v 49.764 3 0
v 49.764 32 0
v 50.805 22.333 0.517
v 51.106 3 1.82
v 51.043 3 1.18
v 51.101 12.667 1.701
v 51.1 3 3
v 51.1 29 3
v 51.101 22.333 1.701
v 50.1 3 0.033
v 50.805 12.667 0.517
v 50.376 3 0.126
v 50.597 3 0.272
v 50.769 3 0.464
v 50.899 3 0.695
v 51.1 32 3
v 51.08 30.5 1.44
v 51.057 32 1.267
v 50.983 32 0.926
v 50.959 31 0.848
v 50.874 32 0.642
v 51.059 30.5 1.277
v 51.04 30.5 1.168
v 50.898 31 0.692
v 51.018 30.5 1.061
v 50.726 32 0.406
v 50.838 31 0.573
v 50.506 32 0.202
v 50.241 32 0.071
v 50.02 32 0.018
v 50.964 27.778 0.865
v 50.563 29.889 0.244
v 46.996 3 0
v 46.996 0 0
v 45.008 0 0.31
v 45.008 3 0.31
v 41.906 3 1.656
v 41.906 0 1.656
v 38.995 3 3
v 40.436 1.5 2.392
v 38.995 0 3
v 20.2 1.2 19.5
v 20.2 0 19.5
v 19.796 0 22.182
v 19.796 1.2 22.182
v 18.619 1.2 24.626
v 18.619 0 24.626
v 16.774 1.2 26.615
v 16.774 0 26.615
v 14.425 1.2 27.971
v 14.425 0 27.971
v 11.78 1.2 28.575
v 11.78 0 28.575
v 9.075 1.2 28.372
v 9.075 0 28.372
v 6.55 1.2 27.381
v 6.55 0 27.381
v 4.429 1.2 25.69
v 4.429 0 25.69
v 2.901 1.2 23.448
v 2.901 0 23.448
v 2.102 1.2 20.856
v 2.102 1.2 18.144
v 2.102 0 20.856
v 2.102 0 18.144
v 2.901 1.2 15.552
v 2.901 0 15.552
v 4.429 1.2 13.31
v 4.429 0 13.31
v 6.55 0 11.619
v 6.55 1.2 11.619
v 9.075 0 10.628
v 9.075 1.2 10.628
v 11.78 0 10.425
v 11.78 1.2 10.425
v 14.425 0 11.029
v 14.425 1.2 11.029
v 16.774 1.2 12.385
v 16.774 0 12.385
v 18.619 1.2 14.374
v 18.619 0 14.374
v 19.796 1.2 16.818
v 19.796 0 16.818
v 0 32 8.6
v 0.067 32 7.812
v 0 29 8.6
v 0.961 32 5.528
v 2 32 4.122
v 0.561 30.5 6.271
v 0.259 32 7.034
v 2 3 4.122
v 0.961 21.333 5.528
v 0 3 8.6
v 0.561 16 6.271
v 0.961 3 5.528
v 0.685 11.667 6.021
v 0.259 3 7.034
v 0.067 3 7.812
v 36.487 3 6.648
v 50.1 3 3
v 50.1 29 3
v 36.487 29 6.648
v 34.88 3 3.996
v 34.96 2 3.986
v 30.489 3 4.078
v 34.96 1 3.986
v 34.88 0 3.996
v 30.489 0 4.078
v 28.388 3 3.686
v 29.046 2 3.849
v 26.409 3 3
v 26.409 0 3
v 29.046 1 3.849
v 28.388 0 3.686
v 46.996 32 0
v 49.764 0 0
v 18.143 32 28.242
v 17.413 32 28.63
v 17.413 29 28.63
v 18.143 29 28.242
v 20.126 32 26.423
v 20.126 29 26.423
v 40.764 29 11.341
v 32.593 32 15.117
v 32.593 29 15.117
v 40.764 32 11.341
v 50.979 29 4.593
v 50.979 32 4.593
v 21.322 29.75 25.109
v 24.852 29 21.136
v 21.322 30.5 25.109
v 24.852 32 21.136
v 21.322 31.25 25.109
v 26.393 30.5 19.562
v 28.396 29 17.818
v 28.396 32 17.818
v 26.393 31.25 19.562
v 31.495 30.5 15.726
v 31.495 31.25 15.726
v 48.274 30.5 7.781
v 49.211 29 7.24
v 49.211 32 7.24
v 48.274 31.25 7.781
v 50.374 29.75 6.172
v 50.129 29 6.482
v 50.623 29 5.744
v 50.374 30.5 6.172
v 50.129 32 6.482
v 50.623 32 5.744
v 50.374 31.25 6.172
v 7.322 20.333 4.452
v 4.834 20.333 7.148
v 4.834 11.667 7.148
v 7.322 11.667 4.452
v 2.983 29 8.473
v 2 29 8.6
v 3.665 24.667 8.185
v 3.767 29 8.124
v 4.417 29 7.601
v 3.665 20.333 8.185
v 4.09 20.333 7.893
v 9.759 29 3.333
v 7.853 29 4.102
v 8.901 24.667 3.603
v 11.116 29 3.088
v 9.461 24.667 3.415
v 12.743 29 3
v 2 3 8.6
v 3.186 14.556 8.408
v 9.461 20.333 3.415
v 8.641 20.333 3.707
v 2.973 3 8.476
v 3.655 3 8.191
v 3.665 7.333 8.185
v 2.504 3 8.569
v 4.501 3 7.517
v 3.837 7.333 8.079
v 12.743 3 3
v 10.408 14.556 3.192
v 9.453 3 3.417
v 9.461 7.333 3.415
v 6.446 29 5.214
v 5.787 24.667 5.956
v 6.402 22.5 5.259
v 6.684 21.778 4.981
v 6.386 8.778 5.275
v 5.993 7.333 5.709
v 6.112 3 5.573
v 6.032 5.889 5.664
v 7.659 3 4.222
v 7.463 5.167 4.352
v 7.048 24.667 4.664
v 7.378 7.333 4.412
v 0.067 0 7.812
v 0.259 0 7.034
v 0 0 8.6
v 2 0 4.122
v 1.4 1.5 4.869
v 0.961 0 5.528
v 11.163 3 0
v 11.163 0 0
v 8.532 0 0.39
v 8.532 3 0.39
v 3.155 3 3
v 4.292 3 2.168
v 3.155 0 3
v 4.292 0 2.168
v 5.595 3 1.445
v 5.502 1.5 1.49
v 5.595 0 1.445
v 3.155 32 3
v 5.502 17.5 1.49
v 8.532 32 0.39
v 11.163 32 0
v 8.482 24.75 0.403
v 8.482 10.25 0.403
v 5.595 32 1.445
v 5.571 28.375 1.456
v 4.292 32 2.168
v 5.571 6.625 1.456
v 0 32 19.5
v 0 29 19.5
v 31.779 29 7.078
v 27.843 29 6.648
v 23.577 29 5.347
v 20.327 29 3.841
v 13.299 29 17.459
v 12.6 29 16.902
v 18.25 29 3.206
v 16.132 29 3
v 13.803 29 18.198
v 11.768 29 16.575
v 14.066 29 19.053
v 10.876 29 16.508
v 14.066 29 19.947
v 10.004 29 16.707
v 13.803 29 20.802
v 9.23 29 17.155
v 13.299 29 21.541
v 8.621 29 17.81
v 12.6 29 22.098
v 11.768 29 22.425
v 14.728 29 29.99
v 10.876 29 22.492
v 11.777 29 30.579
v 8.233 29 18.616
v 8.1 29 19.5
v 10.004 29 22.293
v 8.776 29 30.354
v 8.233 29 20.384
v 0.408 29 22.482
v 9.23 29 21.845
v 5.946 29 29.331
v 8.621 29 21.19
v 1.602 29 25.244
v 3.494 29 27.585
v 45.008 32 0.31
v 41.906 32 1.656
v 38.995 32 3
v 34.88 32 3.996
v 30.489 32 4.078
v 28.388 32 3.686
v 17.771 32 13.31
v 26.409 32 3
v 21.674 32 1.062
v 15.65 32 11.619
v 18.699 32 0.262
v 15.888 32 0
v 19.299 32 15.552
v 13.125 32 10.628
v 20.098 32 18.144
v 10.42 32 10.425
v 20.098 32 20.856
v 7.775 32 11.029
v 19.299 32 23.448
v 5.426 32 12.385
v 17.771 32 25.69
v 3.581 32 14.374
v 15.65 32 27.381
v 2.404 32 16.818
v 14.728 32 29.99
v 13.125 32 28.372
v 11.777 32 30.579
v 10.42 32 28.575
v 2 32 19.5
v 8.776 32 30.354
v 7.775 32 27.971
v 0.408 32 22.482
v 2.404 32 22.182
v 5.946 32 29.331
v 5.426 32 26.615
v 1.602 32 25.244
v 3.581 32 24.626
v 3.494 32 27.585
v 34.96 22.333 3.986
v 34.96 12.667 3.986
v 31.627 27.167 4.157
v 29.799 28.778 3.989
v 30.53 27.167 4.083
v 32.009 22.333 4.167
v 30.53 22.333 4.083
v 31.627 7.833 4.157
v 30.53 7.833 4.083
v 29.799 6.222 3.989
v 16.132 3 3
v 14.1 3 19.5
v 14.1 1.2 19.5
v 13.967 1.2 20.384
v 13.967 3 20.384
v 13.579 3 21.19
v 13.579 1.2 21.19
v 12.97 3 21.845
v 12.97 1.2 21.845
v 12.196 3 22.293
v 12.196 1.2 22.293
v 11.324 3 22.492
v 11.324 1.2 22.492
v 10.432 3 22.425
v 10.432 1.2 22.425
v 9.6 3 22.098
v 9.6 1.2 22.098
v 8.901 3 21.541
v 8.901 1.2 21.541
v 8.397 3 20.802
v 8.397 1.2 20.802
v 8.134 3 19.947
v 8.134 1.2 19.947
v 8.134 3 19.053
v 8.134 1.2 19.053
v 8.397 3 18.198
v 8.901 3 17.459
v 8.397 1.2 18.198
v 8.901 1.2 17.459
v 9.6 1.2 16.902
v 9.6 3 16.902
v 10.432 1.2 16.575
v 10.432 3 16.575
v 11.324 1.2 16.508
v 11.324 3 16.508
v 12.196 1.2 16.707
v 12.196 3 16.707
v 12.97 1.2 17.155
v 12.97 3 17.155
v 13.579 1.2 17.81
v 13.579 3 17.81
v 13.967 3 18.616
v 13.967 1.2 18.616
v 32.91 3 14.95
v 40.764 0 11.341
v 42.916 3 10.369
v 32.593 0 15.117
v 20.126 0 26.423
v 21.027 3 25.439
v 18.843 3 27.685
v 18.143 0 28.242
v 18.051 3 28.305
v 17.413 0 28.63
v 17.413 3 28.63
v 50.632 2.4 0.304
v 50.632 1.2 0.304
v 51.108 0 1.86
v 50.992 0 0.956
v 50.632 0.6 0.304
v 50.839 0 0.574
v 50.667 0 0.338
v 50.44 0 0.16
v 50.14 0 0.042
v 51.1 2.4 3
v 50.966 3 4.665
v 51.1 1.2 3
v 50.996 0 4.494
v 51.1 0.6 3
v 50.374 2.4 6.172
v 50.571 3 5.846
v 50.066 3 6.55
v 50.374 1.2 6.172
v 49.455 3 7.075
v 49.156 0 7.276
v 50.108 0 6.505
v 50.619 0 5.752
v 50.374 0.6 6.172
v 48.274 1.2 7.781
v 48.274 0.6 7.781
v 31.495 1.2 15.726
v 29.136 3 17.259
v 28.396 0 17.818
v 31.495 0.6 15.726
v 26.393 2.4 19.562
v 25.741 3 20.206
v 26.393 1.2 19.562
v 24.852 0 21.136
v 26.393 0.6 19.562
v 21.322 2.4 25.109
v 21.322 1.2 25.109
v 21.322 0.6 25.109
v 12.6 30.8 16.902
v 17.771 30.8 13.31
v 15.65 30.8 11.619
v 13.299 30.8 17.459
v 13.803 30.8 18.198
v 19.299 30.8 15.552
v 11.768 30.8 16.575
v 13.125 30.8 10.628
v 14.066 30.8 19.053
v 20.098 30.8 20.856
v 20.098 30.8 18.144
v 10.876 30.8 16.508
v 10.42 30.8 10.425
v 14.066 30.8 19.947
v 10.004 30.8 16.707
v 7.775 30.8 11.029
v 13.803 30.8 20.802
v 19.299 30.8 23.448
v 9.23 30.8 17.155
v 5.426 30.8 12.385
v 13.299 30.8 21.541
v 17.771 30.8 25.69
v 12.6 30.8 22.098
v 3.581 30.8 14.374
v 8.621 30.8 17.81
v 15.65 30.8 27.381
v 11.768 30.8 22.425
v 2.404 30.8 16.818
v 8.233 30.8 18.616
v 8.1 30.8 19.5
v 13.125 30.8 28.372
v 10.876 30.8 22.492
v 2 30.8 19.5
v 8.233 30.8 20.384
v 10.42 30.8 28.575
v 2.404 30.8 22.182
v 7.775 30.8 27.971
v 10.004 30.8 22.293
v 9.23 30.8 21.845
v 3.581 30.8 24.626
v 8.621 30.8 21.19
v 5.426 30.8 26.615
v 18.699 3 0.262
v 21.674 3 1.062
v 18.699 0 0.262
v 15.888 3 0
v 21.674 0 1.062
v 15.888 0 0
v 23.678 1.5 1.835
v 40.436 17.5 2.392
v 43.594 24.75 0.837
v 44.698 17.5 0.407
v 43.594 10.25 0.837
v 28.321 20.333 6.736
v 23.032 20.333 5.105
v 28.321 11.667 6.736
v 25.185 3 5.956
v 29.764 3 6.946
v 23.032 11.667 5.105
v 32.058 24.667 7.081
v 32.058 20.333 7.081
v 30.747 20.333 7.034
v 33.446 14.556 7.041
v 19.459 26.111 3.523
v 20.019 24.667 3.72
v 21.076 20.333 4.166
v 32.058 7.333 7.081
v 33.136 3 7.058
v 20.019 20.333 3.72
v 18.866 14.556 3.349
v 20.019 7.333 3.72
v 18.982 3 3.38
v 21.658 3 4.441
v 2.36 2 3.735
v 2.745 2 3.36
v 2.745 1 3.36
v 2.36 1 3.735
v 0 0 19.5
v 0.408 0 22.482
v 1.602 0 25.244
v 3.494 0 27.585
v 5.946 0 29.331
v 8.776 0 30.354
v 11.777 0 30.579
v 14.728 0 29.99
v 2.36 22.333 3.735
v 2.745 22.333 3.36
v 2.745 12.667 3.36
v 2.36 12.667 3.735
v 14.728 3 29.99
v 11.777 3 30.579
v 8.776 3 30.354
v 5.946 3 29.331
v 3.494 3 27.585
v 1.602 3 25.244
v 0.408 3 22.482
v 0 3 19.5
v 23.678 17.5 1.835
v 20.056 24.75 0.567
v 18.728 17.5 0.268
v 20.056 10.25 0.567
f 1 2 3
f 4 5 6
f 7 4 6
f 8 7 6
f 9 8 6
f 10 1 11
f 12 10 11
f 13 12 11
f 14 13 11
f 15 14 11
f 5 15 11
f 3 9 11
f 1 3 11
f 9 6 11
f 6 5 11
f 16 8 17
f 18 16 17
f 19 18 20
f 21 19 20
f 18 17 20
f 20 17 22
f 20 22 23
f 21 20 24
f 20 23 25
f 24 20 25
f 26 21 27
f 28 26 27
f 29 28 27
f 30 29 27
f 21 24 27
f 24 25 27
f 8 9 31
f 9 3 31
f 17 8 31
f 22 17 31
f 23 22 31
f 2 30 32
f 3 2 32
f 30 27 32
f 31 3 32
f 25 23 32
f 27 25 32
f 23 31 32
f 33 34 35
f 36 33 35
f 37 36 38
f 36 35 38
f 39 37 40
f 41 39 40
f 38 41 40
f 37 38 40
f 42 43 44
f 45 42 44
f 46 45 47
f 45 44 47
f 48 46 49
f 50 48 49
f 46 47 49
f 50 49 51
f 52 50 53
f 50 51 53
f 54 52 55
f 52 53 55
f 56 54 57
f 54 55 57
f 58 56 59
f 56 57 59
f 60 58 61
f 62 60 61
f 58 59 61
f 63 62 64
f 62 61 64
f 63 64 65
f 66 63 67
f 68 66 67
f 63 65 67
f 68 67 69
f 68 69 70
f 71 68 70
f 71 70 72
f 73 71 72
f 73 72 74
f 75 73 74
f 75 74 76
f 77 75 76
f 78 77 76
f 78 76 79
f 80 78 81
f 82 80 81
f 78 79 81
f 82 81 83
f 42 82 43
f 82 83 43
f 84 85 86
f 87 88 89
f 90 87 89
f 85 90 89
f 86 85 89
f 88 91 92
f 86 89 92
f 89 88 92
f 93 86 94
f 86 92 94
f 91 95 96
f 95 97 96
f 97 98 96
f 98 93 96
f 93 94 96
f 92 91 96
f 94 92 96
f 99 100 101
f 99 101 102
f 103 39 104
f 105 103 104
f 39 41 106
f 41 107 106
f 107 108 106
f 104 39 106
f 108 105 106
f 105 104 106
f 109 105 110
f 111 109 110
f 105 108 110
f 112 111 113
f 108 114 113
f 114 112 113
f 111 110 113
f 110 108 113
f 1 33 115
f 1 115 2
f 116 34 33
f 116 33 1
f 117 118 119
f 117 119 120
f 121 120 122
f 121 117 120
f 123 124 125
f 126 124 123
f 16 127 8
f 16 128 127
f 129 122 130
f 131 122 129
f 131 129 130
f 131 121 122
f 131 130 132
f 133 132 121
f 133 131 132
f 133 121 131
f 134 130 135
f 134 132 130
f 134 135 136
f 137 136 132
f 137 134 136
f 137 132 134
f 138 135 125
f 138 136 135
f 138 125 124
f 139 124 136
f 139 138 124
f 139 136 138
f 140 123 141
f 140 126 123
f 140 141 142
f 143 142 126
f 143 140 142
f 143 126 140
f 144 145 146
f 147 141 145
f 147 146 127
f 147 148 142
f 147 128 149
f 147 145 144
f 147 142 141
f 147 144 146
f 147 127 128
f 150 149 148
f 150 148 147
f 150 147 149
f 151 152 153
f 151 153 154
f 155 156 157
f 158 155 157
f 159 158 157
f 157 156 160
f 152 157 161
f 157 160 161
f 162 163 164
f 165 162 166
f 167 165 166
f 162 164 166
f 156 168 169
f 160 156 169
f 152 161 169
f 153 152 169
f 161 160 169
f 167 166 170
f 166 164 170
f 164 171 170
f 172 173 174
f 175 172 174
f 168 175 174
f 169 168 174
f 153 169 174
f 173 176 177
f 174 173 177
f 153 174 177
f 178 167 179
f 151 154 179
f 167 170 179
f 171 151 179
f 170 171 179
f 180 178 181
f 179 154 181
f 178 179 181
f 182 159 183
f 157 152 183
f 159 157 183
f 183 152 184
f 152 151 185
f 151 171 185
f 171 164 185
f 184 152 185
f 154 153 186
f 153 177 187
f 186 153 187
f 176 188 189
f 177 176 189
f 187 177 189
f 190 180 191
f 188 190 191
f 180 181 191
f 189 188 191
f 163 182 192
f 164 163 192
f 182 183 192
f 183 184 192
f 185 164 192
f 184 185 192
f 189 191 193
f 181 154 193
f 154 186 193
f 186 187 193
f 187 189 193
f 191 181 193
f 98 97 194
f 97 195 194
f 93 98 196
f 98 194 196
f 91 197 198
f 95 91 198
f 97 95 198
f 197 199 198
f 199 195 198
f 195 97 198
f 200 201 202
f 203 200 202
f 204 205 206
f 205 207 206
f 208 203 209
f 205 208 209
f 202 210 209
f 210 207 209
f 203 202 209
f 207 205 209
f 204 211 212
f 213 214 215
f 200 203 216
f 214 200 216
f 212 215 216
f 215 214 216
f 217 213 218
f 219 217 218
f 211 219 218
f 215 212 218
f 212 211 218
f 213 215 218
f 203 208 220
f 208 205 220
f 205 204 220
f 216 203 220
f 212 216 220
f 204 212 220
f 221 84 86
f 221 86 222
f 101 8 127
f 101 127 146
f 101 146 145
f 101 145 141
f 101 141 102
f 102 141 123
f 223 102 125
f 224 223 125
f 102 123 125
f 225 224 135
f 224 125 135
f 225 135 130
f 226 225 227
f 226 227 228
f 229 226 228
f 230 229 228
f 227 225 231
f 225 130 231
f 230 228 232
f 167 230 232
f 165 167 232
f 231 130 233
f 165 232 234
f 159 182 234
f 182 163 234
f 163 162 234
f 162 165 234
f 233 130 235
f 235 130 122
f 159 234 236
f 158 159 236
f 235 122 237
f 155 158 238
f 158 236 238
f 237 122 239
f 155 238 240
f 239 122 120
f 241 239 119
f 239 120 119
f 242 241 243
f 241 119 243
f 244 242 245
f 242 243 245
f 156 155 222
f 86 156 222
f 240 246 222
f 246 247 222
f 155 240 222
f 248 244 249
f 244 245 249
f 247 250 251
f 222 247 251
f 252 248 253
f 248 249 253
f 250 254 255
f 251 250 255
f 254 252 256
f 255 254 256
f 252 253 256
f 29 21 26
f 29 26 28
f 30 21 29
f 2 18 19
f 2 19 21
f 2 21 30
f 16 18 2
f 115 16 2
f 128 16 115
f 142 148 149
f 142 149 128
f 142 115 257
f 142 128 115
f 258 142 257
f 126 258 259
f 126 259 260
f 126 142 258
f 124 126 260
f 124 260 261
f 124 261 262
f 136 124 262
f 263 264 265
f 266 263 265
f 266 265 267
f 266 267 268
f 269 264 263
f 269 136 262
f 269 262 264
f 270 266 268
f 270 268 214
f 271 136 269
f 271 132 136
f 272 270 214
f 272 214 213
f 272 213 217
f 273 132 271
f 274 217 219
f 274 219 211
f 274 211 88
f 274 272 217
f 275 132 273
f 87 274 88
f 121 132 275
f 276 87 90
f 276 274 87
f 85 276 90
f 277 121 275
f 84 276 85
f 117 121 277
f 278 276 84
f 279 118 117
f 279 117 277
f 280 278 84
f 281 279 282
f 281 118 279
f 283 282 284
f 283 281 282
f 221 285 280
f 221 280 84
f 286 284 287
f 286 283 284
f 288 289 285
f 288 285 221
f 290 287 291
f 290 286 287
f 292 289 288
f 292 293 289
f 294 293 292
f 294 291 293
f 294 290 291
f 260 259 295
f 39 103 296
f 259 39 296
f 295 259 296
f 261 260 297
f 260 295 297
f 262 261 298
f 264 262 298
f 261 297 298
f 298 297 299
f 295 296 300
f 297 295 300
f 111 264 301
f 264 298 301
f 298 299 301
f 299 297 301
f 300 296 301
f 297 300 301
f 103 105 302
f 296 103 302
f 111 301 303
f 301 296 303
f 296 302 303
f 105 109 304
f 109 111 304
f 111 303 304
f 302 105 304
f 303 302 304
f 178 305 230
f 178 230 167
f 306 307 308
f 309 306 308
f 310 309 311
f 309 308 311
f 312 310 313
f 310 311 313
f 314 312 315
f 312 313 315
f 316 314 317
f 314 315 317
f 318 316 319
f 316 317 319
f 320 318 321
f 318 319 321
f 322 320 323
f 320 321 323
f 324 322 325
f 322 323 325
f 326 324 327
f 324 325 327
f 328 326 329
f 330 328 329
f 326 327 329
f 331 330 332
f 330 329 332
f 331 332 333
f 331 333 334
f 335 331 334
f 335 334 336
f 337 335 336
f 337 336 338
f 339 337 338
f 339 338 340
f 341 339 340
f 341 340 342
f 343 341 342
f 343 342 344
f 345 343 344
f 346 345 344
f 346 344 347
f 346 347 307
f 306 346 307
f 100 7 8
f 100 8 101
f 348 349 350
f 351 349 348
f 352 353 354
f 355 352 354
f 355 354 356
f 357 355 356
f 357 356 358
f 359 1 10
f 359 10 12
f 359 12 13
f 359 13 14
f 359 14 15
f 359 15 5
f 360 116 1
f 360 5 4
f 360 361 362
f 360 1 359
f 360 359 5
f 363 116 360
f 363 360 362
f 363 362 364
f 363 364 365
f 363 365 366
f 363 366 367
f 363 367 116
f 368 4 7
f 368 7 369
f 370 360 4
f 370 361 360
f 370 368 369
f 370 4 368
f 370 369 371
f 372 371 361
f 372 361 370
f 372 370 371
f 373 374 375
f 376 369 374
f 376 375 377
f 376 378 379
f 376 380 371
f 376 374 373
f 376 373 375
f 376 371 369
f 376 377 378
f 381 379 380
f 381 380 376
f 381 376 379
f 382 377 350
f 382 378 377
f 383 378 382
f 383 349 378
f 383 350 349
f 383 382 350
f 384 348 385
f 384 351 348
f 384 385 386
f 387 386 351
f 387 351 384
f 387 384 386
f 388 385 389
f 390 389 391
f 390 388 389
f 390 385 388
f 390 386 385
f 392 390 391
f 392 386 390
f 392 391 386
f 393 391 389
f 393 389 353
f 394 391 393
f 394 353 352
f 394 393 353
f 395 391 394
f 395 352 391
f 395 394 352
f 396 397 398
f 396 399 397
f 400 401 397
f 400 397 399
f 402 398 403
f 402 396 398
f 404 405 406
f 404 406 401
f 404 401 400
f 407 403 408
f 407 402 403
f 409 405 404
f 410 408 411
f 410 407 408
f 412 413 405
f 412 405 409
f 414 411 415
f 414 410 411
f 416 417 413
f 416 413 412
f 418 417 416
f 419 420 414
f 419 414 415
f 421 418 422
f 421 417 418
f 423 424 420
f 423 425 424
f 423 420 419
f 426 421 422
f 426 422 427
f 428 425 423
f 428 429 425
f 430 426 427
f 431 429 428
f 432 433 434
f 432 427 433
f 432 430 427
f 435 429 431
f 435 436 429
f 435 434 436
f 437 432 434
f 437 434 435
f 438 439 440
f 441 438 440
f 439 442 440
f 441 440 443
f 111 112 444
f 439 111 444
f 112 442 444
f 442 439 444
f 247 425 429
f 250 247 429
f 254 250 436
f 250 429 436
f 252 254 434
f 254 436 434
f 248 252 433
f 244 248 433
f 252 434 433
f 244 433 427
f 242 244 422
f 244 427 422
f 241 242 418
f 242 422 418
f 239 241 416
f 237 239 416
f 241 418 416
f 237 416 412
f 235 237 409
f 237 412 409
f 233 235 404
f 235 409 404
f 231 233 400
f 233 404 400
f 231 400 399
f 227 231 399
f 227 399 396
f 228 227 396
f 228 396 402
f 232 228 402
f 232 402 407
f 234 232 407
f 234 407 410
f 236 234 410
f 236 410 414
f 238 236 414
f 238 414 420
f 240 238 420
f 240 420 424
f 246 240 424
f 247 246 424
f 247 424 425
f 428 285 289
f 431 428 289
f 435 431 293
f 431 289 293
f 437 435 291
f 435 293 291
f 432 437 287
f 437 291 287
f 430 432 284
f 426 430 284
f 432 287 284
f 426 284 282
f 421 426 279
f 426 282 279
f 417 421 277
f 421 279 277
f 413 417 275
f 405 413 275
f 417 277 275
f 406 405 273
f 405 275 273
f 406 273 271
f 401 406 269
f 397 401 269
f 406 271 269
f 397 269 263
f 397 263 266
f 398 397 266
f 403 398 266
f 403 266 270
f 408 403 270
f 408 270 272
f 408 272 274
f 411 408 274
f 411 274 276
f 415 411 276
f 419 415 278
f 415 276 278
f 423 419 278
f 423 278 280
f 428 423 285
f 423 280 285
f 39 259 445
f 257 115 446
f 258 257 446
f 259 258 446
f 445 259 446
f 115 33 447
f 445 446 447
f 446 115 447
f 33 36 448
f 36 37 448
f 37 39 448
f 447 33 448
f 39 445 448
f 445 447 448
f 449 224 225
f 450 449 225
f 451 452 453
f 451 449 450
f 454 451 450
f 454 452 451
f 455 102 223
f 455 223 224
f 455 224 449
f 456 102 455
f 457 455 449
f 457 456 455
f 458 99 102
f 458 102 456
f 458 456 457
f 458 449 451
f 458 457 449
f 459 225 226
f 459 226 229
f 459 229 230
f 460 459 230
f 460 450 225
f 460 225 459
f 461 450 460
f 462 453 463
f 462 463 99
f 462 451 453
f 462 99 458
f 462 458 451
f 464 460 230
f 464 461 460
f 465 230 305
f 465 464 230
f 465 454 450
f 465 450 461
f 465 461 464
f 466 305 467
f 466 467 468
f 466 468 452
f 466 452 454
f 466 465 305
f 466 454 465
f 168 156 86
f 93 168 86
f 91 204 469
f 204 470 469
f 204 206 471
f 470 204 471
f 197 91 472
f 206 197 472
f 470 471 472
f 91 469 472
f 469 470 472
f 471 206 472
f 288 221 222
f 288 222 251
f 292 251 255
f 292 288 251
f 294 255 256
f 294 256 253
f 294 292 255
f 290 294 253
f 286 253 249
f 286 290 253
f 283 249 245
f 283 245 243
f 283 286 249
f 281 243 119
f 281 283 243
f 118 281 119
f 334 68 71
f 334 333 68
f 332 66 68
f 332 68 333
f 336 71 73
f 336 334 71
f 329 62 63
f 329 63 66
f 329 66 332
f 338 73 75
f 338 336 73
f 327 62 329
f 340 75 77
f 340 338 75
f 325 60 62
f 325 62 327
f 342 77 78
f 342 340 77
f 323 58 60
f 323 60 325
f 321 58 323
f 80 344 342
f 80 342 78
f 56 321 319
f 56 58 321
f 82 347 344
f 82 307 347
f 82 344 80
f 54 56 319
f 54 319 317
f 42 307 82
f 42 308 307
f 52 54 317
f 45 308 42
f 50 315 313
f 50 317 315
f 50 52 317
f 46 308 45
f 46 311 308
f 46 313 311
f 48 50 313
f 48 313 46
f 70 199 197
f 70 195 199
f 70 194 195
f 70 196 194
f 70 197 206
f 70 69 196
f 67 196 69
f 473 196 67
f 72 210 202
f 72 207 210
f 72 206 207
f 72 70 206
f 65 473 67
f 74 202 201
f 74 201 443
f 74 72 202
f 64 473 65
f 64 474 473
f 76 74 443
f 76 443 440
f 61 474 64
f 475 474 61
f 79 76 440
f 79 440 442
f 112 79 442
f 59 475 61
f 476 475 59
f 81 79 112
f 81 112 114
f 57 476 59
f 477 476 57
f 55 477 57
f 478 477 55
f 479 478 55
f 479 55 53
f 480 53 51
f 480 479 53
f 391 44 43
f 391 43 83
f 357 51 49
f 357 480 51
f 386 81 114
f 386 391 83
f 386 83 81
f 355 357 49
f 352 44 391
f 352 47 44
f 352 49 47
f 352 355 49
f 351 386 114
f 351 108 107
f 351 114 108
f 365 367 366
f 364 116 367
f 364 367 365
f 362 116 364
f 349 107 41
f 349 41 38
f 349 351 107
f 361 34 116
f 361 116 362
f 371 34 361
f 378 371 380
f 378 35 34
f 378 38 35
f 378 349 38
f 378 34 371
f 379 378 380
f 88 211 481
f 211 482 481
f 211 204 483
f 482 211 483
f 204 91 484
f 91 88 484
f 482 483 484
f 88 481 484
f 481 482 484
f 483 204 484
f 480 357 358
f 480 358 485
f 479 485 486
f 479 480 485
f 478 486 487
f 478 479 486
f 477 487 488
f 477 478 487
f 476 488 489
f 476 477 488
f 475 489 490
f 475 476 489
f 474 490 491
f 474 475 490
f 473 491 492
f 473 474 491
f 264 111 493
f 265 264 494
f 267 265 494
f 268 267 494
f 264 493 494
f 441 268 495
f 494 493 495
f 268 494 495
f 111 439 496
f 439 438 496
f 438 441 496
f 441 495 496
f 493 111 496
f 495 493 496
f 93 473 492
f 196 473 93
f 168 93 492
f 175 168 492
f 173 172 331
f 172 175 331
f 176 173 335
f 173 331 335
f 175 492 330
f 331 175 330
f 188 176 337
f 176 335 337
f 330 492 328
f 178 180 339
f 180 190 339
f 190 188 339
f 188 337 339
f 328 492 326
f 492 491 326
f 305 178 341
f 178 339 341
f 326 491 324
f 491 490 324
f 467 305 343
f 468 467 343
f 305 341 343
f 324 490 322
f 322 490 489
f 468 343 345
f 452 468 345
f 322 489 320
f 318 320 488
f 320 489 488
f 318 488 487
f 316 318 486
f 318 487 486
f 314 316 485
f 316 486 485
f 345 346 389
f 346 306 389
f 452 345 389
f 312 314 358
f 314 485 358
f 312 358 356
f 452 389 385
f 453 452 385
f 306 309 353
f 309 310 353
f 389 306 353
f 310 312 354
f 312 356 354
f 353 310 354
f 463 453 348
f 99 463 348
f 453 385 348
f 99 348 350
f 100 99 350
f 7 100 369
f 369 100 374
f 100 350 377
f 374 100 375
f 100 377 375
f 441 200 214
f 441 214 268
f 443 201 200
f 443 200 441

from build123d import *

# Parameters (mm, degrees)
F0_R     = 9.1
F0_R_2   = 3
F1_DEPTH = 3
F2_DEPTH = 32
F3_R     = 9.1
F3_R_2   = 3
F4_DEPTH = 3
F5_DEPTH = 1.2
F6_DEPTH = 1.2


# Not quite as in the source:
# - the dataset's text gives a spline's control points without its knots; the knots are read off the source's solid


with BuildPart() as f1:
    # F0 (on Front) → F1 (new body)
    with BuildSketch(Plane.XZ):
        with BuildLine():
            ThreePointArc((17.4131177763, 28.6298709707), (5.94566238, 29.330707182), (0, 19.5000000088))
            ThreePointArc((0, 19.5000000088), (11.0999999956, 8.4), (22.2, 19.5))
            ThreePointArc((22.2, 19.5), (20.93070718, 24.6543376239), (17.4131177763, 28.6298709707))
        make_face()
        with Locations((11.1, 19.5)):
            Circle(F0_R, mode=Mode.SUBTRACT)
        with BuildLine():
            Line((0, 19.5000000088), (0, 8.6))
            Line((0, 8.6), (2, 8.6))
            add(Edge.make_bspline(
                [(2, 8.6), (6.1005279422, 8.6), (4.7618634999, 3), (12.7434981987, 3)],
                knots=[0, 0, 0, 0, 12.1153932477, 12.1153932477, 12.1153932477, 12.1153932477], degree=3))
            Line((12.7434981987, 3), (16.1323161151, 3))
            add(Edge.make_bspline(
                [(36.4871002909, 6.6475654837), (33.250513749, 7.2772264404), (28.4821757642, 7.0333812875), (22.7707461668, 5.2870830071), (19.2182583484, 3), (16.1323161151, 3)],
                knots=[0, 0, 0, 0, 0.3619231415, 0.6598619876, 1, 1, 1, 1], degree=3))
            Line((36.4871002909, 6.6475654837), (50.1, 3))
            Line((50.1, 3), (51.1, 3))
            add(Edge.make_bspline(
                [(17.4131177763, 28.6298709707), (19.3173309809, 28.0148434267), (26.5141621262, 17.8054561903), (36.3055294732, 13.2861047363), (48.6152121195, 7.9013395134), (51.1, 6.0645417062), (51.1, 3)],
                knots=[0, 0, 0, 0, 0.2751149516, 0.5468245458, 0.818510602, 1, 1, 1, 1], degree=3))
            ThreePointArc((17.4131177763, 28.6298709707), (20.93070718, 24.6543376239), (22.2, 19.5))
            ThreePointArc((22.2, 19.5), (11.0999999956, 8.4), (0, 19.5000000088))
        make_face()
        with Locations((11.1, 19.5)):
            Circle(F0_R)
        with Locations((11.1, 19.5)):
            Circle(F0_R_2, mode=Mode.SUBTRACT)
        with BuildLine():
            add(Edge.make_bspline(
                [(36.4871002909, 6.6475654837), (33.250513749, 7.2772264404), (28.4821757642, 7.0333812875), (22.7707461668, 5.2870830071), (19.2182583484, 3), (16.1323161151, 3)],
                knots=[0, 0, 0, 0, 0.3619231415, 0.6598619876, 1, 1, 1, 1], degree=3))
            Line((16.1323161151, 3), (26.4085768866, 3))
            add(Edge.make_bspline(
                [(38.9945048839, 3), (37.6672047291, 3.494469873), (34.5451444696, 4.2269106386), (29.9007307702, 4.2671179583), (27.2729407986, 3.3486511872), (26.4085768866, 3)],
                knots=[0.2580240809, 0.2580240809, 0.2580240809, 0.2580240809, 0.396530844, 0.588257037, 0.6815213918, 0.6815213918, 0.6815213918, 0.6815213918], degree=3))
            Line((38.9945048839, 3), (50.1, 3))
            Line((50.1, 3), (36.4871002909, 6.6475654837))
        make_face()
        with BuildLine():
            Line((12.7434981987, 3), (3.1549932572, 3))
            add(Edge.make_bspline(
                [(11.1625680027, 0), (9.6983325574, 0), (6.2580804616, 0.8511709187), (3.8354236598, 2.4325332537), (3.1549932572, 3)],
                knots=[0, 0, 0, 0, 0.3599781606, 0.5310380634, 0.5310380634, 0.5310380634, 0.5310380634], degree=3))
            Line((11.1625680027, 0), (15.8881638199, 0))
            add(Edge.make_bspline(
                [(26.4085768866, 3), (25.5236936564, 2.6430721083), (22.55665667, 1.2844222732), (18.8493595825, 0), (15.8881638199, 0)],
                knots=[0.6815213918, 0.6815213918, 0.6815213918, 0.6815213918, 0.776999769, 1, 1, 1, 1], degree=3))
            Line((26.4085768866, 3), (16.1323161151, 3))
            Line((16.1323161151, 3), (12.7434981987, 3))
        make_face()
        with BuildLine():
            add(Edge.make_bspline(
                [(51.1, 3), (51.1, 1.8280865625), (51.3270497322, 0), (49.7638843954, 0)],
                knots=[0, 0, 0, 0, 3.2840835722, 3.2840835722, 3.2840835722, 3.2840835722], degree=3))
            Line((51.1, 3), (50.1, 3))
            Line((50.1, 3), (38.9945048839, 3))
            add(Edge.make_bspline(
                [(46.9955906657, 0), (44.6339409881, 0), (41.9557123636, 1.7760040782), (39.4711509433, 2.8224311844), (38.9945048839, 3)],
                knots=[0, 0, 0, 0, 0.2082849902, 0.2580240809, 0.2580240809, 0.2580240809, 0.2580240809], degree=3))
            Line((46.9955906657, 0), (49.7638843954, 0))
        make_face()
        with BuildLine():
            add(Edge.make_bspline(
                [(3.1549932572, 3), (2.7317734101, 3.3529577584), (2.3472268202, 3.728382037), (2, 4.1220149827)],
                knots=[0.5310380634, 0.5310380634, 0.5310380634, 0.5310380634, 0.6374353462, 0.6374353462, 0.6374353462, 0.6374353462], degree=3))
            Line((3.1549932572, 3), (12.7434981987, 3))
            add(Edge.make_bspline(
                [(2, 8.6), (6.1005279422, 8.6), (4.7618634999, 3), (12.7434981987, 3)],
                knots=[0, 0, 0, 0, 12.1153932477, 12.1153932477, 12.1153932477, 12.1153932477], degree=3))
            Line((2, 8.6), (2, 4.1220149827))
        make_face()
        with BuildLine():
            Line((2, 8.6), (0, 8.6))
            add(Edge.make_bspline(
                [(2, 4.1220149827), (1.7860800359, 4.3645248947), (0.6812014398, 5.7441151101), (0, 7.3046851351), (0, 8.6)],
                knots=[0.6374353462, 0.6374353462, 0.6374353462, 0.6374353462, 0.7029847265, 1, 1, 1, 1], degree=3))
            Line((2, 4.1220149827), (2, 8.6))
        make_face()
    extrude(amount=-F1_DEPTH)

    # F0 (on Front) → F2 (join)
    with BuildSketch(Plane.XZ):
        with BuildLine():
            Line((12.7434981987, 3), (3.1549932572, 3))
            add(Edge.make_bspline(
                [(11.1625680027, 0), (9.6983325574, 0), (6.2580804616, 0.8511709187), (3.8354236598, 2.4325332537), (3.1549932572, 3)],
                knots=[0, 0, 0, 0, 0.3599781606, 0.5310380634, 0.5310380634, 0.5310380634, 0.5310380634], degree=3))
            Line((11.1625680027, 0), (15.8881638199, 0))
            add(Edge.make_bspline(
                [(26.4085768866, 3), (25.5236936564, 2.6430721083), (22.55665667, 1.2844222732), (18.8493595825, 0), (15.8881638199, 0)],
                knots=[0.6815213918, 0.6815213918, 0.6815213918, 0.6815213918, 0.776999769, 1, 1, 1, 1], degree=3))
            Line((26.4085768866, 3), (16.1323161151, 3))
            Line((16.1323161151, 3), (12.7434981987, 3))
        make_face()
        with BuildLine():
            Line((2, 8.6), (0, 8.6))
            add(Edge.make_bspline(
                [(2, 4.1220149827), (1.7860800359, 4.3645248947), (0.6812014398, 5.7441151101), (0, 7.3046851351), (0, 8.6)],
                knots=[0.6374353462, 0.6374353462, 0.6374353462, 0.6374353462, 0.7029847265, 1, 1, 1, 1], degree=3))
            Line((2, 4.1220149827), (2, 8.6))
        make_face()
        with BuildLine():
            add(Edge.make_bspline(
                [(36.4871002909, 6.6475654837), (33.250513749, 7.2772264404), (28.4821757642, 7.0333812875), (22.7707461668, 5.2870830071), (19.2182583484, 3), (16.1323161151, 3)],
                knots=[0, 0, 0, 0, 0.3619231415, 0.6598619876, 1, 1, 1, 1], degree=3))
            Line((16.1323161151, 3), (26.4085768866, 3))
            add(Edge.make_bspline(
                [(38.9945048839, 3), (37.6672047291, 3.494469873), (34.5451444696, 4.2269106386), (29.9007307702, 4.2671179583), (27.2729407986, 3.3486511872), (26.4085768866, 3)],
                knots=[0.2580240809, 0.2580240809, 0.2580240809, 0.2580240809, 0.396530844, 0.588257037, 0.6815213918, 0.6815213918, 0.6815213918, 0.6815213918], degree=3))
            Line((38.9945048839, 3), (50.1, 3))
            Line((50.1, 3), (36.4871002909, 6.6475654837))
        make_face()
        with BuildLine():
            add(Edge.make_bspline(
                [(51.1, 3), (51.1, 1.8280865625), (51.3270497322, 0), (49.7638843954, 0)],
                knots=[0, 0, 0, 0, 3.2840835722, 3.2840835722, 3.2840835722, 3.2840835722], degree=3))
            Line((51.1, 3), (50.1, 3))
            Line((50.1, 3), (38.9945048839, 3))
            add(Edge.make_bspline(
                [(46.9955906657, 0), (44.6339409881, 0), (41.9557123636, 1.7760040782), (39.4711509433, 2.8224311844), (38.9945048839, 3)],
                knots=[0, 0, 0, 0, 0.2082849902, 0.2580240809, 0.2580240809, 0.2580240809, 0.2580240809], degree=3))
            Line((46.9955906657, 0), (49.7638843954, 0))
        make_face()
        with BuildLine():
            add(Edge.make_bspline(
                [(3.1549932572, 3), (2.7317734101, 3.3529577584), (2.3472268202, 3.728382037), (2, 4.1220149827)],
                knots=[0.5310380634, 0.5310380634, 0.5310380634, 0.5310380634, 0.6374353462, 0.6374353462, 0.6374353462, 0.6374353462], degree=3))
            Line((3.1549932572, 3), (12.7434981987, 3))
            add(Edge.make_bspline(
                [(2, 8.6), (6.1005279422, 8.6), (4.7618634999, 3), (12.7434981987, 3)],
                knots=[0, 0, 0, 0, 12.1153932477, 12.1153932477, 12.1153932477, 12.1153932477], degree=3))
            Line((2, 8.6), (2, 4.1220149827))
        make_face()
    extrude(amount=-F2_DEPTH)

    # F3 (on face) → F4 (join)
    with BuildSketch(Plane(origin=(0, 32, 0), x_dir=(-1, 0, 0), z_dir=(0, 1, 0))):
        with BuildLine():
            ThreePointArc((0, 19.5), (-5.9456623761, 29.33070718), (-17.4131177763, 28.6298709707))
            add(Edge.make_bspline(
                [(-17.4131177763, 28.6298709707), (-19.3173309809, 28.0148434267), (-26.5141621262, 17.8054561903), (-36.3055294732, 13.2861047363), (-48.6152121195, 7.9013395134), (-51.1, 6.0645417062), (-51.1, 3)],
                knots=[0, 0, 0, 0, 0.2751149516, 0.5468245458, 0.818510602, 1, 1, 1, 1], degree=3))
            Line((-51.1, 3), (-50.1, 3))
            Line((-50.1, 3), (-36.4871002909, 6.6475654837))
            add(Edge.make_bspline(
                [(-36.4871002909, 6.6475654837), (-33.250513749, 7.2772264404), (-28.4821757642, 7.0333812875), (-22.7707461668, 5.2870830071), (-19.2182583484, 3), (-16.1323161151, 3)],
                knots=[0, 0, 0, 0, 0.3619231415, 0.6598619876, 1, 1, 1, 1], degree=3))
            Line((-16.1323161151, 3), (-12.7434981987, 3))
            add(Edge.make_bspline(
                [(-2, 8.6), (-6.1005279422, 8.6), (-4.7618634999, 3), (-12.7434981987, 3)],
                knots=[0, 0, 0, 0, 12.1153932477, 12.1153932477, 12.1153932477, 12.1153932477], degree=3))
            Line((-2, 8.6), (0, 8.6))
            Line((0, 8.6), (0, 19.5))
        make_face()
        with Locations((-11.1, 19.5)):
            Circle(F3_R, mode=Mode.SUBTRACT)
        with Locations((-11.1, 19.5)):
            Circle(F3_R)
        with Locations((-11.1, 19.5)):
            Circle(F3_R_2, mode=Mode.SUBTRACT)
    extrude(amount=-F4_DEPTH)

    # F0 (on Front) → F5 (cut)
    with BuildSketch(Plane.XZ):
        with Locations((11.1, 19.5)):
            Circle(F0_R)
        with Locations((11.1, 19.5)):
            Circle(F0_R_2, mode=Mode.SUBTRACT)
    extrude(amount=-F5_DEPTH, mode=Mode.SUBTRACT)

    # F3 (on face) → F6 (cut)
    with BuildSketch(Plane(origin=(0, 32, 0), x_dir=(-1, 0, 0), z_dir=(0, 1, 0))):
        with Locations((-11.1, 19.5)):
            Circle(F3_R)
        with Locations((-11.1, 19.5)):
            Circle(F3_R_2, mode=Mode.SUBTRACT)
    extrude(amount=-F6_DEPTH, mode=Mode.SUBTRACT)


solid = f1.part
